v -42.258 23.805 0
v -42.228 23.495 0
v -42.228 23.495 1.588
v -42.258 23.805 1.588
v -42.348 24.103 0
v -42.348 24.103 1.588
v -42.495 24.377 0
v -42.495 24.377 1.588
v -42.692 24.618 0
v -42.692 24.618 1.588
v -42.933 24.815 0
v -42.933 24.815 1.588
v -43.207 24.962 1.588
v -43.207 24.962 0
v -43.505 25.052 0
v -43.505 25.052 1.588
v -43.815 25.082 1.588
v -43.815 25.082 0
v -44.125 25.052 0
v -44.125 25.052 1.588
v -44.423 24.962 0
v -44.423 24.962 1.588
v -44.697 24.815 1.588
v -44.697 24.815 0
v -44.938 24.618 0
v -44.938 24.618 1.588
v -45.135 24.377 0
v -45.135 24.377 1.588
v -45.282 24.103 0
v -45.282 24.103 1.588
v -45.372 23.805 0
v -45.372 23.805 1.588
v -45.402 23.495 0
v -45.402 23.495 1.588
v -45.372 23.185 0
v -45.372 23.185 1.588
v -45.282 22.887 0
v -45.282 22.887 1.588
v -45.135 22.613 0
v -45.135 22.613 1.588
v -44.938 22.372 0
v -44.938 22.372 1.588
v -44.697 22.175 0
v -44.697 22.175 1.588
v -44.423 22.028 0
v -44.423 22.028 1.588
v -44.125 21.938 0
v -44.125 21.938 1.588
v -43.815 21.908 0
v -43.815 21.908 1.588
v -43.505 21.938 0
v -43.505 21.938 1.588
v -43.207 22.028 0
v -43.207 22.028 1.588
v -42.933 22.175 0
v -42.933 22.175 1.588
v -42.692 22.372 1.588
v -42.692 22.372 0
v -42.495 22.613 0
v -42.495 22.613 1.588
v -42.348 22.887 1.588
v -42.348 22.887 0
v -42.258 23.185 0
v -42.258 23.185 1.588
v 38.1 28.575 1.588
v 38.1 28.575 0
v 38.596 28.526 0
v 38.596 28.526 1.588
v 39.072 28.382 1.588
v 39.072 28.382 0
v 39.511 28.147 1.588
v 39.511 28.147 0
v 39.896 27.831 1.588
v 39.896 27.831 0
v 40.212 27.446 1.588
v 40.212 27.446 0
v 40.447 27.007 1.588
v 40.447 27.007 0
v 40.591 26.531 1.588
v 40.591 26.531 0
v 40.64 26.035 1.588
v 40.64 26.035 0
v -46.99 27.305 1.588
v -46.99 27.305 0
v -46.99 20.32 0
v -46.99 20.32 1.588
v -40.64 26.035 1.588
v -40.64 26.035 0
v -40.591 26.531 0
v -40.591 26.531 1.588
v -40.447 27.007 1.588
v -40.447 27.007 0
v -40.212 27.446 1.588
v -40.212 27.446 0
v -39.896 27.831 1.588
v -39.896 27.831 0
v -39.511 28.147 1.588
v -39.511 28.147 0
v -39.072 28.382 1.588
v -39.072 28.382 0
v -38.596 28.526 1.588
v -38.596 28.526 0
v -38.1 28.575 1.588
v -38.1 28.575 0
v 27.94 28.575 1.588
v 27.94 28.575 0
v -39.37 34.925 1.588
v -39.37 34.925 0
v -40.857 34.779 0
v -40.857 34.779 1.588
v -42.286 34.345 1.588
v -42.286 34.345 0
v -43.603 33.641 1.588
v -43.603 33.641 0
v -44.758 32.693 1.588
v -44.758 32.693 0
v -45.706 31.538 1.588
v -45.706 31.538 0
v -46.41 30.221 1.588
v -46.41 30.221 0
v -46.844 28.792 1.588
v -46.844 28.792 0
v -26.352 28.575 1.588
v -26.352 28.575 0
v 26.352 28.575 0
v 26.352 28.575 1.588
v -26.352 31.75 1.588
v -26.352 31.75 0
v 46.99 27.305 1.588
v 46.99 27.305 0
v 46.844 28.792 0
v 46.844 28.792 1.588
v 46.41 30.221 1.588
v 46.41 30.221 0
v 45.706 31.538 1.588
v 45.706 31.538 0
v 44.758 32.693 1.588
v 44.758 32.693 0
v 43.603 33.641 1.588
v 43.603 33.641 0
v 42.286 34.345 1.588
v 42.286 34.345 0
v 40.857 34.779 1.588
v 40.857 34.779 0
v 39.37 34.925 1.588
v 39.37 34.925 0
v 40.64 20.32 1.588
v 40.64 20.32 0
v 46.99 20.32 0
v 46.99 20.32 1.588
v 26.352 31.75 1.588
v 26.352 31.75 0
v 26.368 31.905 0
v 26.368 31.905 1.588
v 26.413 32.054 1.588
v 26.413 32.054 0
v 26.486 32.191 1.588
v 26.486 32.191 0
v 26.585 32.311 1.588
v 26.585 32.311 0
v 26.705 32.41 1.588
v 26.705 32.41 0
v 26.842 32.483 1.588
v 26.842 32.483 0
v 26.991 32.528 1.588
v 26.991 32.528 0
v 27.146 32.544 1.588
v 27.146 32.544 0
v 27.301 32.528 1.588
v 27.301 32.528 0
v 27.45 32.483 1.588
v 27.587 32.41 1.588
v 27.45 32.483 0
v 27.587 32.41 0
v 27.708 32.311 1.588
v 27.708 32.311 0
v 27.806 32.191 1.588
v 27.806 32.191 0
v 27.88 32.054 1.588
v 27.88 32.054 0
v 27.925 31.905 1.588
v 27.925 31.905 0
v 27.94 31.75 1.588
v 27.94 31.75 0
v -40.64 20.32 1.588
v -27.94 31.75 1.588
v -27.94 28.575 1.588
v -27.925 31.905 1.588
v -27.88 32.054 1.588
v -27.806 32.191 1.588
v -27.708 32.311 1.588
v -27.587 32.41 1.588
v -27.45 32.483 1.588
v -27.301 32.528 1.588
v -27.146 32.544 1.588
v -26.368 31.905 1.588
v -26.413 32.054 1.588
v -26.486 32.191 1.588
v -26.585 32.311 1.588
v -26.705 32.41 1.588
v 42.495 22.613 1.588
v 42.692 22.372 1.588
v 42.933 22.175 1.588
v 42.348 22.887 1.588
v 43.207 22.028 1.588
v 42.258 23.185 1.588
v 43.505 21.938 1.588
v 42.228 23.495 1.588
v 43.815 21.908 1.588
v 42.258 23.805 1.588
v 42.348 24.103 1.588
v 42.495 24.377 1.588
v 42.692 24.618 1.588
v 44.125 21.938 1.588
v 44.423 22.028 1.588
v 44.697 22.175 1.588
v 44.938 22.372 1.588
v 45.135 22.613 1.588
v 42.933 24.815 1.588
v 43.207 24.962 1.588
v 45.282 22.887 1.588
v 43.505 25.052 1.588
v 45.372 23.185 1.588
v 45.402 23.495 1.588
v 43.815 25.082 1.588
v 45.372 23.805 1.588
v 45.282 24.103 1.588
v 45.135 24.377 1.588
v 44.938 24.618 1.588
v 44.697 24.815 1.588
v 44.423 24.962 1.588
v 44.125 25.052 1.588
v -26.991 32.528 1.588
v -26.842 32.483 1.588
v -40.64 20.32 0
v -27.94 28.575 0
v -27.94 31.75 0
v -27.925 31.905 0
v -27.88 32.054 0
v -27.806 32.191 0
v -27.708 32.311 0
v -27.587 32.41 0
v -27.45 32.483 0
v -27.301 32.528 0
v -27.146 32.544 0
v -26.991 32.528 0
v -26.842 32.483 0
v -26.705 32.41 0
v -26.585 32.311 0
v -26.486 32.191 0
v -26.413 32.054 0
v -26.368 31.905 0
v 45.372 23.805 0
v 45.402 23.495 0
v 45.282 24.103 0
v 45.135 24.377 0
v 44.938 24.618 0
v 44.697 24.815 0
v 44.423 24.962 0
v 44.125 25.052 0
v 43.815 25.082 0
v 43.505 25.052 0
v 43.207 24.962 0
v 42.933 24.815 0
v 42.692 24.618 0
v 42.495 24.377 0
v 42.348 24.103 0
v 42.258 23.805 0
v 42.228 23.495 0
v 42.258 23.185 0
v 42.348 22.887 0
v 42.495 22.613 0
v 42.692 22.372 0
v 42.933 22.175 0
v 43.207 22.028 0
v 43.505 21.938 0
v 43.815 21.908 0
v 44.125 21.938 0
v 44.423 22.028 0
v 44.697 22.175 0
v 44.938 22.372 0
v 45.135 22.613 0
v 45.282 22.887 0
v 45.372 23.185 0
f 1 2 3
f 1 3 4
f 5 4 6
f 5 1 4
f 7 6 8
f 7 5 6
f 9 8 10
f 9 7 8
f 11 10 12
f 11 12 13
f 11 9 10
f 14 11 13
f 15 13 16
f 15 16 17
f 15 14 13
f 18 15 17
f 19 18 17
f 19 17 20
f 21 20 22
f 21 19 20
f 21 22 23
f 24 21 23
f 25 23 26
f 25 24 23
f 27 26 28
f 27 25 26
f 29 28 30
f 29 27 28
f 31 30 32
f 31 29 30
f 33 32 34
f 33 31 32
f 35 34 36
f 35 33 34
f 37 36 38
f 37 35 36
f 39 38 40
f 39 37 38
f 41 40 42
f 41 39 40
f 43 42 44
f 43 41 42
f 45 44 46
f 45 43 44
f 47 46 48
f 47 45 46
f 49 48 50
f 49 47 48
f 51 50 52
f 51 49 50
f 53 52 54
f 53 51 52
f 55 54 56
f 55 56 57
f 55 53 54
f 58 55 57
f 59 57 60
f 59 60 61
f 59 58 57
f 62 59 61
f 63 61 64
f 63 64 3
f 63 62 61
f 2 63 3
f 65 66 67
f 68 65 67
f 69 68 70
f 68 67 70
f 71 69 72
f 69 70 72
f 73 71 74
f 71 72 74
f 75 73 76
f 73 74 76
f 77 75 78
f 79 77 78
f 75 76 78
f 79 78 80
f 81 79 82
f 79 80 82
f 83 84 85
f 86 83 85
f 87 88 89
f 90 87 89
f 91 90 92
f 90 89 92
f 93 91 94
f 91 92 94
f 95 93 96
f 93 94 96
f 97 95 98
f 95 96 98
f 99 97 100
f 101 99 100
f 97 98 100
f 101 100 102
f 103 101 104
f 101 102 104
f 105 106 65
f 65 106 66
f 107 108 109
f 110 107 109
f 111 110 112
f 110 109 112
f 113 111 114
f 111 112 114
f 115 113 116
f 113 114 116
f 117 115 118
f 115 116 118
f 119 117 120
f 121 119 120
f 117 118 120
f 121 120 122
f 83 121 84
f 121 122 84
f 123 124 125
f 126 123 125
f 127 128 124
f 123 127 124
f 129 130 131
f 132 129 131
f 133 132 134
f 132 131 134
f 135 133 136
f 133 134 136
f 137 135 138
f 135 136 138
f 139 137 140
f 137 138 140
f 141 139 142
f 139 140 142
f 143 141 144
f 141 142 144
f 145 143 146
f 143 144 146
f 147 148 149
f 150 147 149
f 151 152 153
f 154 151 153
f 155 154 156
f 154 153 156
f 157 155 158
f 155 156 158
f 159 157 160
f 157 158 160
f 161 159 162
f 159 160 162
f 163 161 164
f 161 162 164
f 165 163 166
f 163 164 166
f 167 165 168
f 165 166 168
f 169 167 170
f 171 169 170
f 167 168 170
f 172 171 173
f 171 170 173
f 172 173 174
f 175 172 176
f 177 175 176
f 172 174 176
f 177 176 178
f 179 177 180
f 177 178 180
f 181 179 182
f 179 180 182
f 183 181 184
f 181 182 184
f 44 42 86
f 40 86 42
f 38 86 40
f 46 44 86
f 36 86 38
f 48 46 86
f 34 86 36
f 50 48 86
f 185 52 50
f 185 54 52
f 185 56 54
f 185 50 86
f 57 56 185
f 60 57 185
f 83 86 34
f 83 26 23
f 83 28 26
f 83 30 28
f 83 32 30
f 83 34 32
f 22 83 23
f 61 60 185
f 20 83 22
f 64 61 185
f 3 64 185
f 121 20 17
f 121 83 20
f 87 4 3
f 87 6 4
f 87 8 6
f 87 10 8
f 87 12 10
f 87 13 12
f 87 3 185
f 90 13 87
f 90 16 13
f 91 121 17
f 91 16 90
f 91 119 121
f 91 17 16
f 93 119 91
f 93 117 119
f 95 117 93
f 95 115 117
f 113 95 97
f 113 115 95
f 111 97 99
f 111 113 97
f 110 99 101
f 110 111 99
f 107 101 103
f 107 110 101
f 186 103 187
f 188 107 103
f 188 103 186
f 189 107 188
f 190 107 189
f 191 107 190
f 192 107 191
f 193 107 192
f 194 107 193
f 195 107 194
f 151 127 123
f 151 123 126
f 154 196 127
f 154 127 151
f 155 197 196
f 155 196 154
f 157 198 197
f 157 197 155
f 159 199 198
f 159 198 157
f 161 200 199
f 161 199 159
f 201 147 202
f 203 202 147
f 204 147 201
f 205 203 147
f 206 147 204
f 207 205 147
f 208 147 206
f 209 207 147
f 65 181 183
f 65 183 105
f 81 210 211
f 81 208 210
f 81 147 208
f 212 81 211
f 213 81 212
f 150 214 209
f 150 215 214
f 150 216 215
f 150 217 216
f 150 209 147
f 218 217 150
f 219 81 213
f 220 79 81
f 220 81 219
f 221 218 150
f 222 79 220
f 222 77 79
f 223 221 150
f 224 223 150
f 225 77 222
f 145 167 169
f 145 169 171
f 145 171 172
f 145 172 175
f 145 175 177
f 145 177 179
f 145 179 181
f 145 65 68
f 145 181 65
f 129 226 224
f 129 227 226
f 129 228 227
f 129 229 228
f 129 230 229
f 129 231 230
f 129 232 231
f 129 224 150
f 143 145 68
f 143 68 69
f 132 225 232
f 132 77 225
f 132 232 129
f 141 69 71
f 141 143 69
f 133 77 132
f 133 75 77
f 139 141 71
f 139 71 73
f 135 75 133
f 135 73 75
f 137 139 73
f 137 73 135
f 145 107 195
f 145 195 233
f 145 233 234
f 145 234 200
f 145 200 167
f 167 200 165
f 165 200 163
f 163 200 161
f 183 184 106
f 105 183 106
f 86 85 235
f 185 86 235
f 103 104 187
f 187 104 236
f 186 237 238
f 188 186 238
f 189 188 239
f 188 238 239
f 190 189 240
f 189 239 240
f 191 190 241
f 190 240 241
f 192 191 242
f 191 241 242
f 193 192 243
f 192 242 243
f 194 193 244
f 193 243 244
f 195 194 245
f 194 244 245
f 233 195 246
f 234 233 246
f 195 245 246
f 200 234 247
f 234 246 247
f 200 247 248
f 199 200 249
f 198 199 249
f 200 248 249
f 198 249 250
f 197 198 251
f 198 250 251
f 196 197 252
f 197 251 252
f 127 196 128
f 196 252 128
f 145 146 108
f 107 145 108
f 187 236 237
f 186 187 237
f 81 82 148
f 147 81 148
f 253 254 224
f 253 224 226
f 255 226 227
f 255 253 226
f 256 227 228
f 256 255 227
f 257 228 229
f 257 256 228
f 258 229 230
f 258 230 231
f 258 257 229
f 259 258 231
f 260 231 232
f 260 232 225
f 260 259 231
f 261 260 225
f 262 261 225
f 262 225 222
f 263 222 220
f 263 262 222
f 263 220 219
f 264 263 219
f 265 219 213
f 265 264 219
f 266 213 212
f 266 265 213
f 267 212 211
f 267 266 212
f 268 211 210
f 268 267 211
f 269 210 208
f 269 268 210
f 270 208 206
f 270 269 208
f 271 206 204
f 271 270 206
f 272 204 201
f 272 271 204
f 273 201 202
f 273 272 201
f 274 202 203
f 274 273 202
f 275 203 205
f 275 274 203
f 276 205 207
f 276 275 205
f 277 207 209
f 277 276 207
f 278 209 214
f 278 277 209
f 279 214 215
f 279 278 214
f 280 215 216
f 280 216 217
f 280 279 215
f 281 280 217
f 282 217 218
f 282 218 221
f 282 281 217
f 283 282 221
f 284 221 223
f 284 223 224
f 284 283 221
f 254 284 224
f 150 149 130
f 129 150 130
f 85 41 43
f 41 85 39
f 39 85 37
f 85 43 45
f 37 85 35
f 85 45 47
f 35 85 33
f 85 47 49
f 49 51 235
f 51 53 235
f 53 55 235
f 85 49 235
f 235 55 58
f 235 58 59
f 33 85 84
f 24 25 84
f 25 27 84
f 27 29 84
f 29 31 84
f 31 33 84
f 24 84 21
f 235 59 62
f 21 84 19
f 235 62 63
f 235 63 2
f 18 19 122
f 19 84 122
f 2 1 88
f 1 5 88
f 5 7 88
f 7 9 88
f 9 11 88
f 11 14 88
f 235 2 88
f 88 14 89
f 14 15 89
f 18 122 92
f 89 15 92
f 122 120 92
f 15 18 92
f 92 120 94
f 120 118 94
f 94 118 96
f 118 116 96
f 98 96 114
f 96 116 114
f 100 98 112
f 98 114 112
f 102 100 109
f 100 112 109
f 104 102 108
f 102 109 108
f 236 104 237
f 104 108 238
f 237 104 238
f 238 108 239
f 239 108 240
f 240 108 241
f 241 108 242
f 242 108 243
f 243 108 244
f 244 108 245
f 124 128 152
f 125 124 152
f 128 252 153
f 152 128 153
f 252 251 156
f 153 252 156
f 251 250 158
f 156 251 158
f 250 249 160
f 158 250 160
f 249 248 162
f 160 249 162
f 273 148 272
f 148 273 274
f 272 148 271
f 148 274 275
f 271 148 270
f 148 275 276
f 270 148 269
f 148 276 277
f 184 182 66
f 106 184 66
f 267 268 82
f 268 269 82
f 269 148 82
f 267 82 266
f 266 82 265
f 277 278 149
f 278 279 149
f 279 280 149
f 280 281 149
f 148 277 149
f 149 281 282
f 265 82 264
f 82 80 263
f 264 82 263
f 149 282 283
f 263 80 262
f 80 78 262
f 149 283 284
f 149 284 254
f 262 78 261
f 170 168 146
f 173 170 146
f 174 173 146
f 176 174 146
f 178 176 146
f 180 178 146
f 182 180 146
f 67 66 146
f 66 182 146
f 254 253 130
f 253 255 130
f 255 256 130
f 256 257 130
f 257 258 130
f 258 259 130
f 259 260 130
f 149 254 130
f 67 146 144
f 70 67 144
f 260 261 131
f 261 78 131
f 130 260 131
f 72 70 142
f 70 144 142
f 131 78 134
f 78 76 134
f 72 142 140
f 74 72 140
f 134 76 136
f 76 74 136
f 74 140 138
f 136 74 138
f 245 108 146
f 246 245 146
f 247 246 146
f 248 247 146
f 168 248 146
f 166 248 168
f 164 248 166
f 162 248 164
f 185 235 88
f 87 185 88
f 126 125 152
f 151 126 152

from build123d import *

# Parameters (mm, degrees)
SKETCH1_R           = 1.5875
BOSS_EXTRUDE1_DEPTH = 1.5875


with BuildPart() as part:
    # Sketch1 → Boss-Extrude1 (new body)
    with BuildSketch(Plane.XY):
        with BuildLine():
            Line((-40.64, 20.32), (-40.64, 26.035))
            ThreePointArc((-40.64, 26.035), (-39.896051224, 27.831051224), (-38.1, 28.575))
            Line((-38.1, 28.575), (-27.94, 28.575))
            Line((-27.94, 28.575), (-27.94, 31.75))
            ThreePointArc((-27.94, 31.75), (-27.14625, 32.54375), (-26.3525, 31.75))
            Line((-26.3525, 31.75), (-26.3525, 28.575))
            Line((-26.3525, 28.575), (26.3525, 28.575))
            Line((26.3525, 28.575), (26.3525, 31.75))
            ThreePointArc((26.3525, 31.75), (27.14625, 32.54375), (27.94, 31.75))
            Line((27.94, 31.75), (27.94, 28.575))
            Line((27.94, 28.575), (38.1, 28.575))
            ThreePointArc((38.1, 28.575), (39.896051224, 27.831051224), (40.64, 26.035))
            Line((40.64, 26.035), (40.64, 20.32))
            Line((40.64, 20.32), (46.99, 20.32))
            Line((46.99, 20.32), (46.99, 27.305))
            ThreePointArc((46.99, 27.305), (44.758153673, 32.693153673), (39.37, 34.925))
            Line((39.37, 34.925), (-39.37, 34.925))
            ThreePointArc((-39.37, 34.925), (-44.758153673, 32.693153673), (-46.99, 27.305))
            Line((-46.99, 27.305), (-46.99, 20.32))
            Line((-46.99, 20.32), (-40.64, 20.32))
        make_face()
        with Locations((-43.815, 23.495)):
            Circle(SKETCH1_R, mode=Mode.SUBTRACT)
        with Locations((43.815, 23.495)):
            Circle(SKETCH1_R, mode=Mode.SUBTRACT)
    extrude(amount=BOSS_EXTRUDE1_DEPTH)


solid = part.part
